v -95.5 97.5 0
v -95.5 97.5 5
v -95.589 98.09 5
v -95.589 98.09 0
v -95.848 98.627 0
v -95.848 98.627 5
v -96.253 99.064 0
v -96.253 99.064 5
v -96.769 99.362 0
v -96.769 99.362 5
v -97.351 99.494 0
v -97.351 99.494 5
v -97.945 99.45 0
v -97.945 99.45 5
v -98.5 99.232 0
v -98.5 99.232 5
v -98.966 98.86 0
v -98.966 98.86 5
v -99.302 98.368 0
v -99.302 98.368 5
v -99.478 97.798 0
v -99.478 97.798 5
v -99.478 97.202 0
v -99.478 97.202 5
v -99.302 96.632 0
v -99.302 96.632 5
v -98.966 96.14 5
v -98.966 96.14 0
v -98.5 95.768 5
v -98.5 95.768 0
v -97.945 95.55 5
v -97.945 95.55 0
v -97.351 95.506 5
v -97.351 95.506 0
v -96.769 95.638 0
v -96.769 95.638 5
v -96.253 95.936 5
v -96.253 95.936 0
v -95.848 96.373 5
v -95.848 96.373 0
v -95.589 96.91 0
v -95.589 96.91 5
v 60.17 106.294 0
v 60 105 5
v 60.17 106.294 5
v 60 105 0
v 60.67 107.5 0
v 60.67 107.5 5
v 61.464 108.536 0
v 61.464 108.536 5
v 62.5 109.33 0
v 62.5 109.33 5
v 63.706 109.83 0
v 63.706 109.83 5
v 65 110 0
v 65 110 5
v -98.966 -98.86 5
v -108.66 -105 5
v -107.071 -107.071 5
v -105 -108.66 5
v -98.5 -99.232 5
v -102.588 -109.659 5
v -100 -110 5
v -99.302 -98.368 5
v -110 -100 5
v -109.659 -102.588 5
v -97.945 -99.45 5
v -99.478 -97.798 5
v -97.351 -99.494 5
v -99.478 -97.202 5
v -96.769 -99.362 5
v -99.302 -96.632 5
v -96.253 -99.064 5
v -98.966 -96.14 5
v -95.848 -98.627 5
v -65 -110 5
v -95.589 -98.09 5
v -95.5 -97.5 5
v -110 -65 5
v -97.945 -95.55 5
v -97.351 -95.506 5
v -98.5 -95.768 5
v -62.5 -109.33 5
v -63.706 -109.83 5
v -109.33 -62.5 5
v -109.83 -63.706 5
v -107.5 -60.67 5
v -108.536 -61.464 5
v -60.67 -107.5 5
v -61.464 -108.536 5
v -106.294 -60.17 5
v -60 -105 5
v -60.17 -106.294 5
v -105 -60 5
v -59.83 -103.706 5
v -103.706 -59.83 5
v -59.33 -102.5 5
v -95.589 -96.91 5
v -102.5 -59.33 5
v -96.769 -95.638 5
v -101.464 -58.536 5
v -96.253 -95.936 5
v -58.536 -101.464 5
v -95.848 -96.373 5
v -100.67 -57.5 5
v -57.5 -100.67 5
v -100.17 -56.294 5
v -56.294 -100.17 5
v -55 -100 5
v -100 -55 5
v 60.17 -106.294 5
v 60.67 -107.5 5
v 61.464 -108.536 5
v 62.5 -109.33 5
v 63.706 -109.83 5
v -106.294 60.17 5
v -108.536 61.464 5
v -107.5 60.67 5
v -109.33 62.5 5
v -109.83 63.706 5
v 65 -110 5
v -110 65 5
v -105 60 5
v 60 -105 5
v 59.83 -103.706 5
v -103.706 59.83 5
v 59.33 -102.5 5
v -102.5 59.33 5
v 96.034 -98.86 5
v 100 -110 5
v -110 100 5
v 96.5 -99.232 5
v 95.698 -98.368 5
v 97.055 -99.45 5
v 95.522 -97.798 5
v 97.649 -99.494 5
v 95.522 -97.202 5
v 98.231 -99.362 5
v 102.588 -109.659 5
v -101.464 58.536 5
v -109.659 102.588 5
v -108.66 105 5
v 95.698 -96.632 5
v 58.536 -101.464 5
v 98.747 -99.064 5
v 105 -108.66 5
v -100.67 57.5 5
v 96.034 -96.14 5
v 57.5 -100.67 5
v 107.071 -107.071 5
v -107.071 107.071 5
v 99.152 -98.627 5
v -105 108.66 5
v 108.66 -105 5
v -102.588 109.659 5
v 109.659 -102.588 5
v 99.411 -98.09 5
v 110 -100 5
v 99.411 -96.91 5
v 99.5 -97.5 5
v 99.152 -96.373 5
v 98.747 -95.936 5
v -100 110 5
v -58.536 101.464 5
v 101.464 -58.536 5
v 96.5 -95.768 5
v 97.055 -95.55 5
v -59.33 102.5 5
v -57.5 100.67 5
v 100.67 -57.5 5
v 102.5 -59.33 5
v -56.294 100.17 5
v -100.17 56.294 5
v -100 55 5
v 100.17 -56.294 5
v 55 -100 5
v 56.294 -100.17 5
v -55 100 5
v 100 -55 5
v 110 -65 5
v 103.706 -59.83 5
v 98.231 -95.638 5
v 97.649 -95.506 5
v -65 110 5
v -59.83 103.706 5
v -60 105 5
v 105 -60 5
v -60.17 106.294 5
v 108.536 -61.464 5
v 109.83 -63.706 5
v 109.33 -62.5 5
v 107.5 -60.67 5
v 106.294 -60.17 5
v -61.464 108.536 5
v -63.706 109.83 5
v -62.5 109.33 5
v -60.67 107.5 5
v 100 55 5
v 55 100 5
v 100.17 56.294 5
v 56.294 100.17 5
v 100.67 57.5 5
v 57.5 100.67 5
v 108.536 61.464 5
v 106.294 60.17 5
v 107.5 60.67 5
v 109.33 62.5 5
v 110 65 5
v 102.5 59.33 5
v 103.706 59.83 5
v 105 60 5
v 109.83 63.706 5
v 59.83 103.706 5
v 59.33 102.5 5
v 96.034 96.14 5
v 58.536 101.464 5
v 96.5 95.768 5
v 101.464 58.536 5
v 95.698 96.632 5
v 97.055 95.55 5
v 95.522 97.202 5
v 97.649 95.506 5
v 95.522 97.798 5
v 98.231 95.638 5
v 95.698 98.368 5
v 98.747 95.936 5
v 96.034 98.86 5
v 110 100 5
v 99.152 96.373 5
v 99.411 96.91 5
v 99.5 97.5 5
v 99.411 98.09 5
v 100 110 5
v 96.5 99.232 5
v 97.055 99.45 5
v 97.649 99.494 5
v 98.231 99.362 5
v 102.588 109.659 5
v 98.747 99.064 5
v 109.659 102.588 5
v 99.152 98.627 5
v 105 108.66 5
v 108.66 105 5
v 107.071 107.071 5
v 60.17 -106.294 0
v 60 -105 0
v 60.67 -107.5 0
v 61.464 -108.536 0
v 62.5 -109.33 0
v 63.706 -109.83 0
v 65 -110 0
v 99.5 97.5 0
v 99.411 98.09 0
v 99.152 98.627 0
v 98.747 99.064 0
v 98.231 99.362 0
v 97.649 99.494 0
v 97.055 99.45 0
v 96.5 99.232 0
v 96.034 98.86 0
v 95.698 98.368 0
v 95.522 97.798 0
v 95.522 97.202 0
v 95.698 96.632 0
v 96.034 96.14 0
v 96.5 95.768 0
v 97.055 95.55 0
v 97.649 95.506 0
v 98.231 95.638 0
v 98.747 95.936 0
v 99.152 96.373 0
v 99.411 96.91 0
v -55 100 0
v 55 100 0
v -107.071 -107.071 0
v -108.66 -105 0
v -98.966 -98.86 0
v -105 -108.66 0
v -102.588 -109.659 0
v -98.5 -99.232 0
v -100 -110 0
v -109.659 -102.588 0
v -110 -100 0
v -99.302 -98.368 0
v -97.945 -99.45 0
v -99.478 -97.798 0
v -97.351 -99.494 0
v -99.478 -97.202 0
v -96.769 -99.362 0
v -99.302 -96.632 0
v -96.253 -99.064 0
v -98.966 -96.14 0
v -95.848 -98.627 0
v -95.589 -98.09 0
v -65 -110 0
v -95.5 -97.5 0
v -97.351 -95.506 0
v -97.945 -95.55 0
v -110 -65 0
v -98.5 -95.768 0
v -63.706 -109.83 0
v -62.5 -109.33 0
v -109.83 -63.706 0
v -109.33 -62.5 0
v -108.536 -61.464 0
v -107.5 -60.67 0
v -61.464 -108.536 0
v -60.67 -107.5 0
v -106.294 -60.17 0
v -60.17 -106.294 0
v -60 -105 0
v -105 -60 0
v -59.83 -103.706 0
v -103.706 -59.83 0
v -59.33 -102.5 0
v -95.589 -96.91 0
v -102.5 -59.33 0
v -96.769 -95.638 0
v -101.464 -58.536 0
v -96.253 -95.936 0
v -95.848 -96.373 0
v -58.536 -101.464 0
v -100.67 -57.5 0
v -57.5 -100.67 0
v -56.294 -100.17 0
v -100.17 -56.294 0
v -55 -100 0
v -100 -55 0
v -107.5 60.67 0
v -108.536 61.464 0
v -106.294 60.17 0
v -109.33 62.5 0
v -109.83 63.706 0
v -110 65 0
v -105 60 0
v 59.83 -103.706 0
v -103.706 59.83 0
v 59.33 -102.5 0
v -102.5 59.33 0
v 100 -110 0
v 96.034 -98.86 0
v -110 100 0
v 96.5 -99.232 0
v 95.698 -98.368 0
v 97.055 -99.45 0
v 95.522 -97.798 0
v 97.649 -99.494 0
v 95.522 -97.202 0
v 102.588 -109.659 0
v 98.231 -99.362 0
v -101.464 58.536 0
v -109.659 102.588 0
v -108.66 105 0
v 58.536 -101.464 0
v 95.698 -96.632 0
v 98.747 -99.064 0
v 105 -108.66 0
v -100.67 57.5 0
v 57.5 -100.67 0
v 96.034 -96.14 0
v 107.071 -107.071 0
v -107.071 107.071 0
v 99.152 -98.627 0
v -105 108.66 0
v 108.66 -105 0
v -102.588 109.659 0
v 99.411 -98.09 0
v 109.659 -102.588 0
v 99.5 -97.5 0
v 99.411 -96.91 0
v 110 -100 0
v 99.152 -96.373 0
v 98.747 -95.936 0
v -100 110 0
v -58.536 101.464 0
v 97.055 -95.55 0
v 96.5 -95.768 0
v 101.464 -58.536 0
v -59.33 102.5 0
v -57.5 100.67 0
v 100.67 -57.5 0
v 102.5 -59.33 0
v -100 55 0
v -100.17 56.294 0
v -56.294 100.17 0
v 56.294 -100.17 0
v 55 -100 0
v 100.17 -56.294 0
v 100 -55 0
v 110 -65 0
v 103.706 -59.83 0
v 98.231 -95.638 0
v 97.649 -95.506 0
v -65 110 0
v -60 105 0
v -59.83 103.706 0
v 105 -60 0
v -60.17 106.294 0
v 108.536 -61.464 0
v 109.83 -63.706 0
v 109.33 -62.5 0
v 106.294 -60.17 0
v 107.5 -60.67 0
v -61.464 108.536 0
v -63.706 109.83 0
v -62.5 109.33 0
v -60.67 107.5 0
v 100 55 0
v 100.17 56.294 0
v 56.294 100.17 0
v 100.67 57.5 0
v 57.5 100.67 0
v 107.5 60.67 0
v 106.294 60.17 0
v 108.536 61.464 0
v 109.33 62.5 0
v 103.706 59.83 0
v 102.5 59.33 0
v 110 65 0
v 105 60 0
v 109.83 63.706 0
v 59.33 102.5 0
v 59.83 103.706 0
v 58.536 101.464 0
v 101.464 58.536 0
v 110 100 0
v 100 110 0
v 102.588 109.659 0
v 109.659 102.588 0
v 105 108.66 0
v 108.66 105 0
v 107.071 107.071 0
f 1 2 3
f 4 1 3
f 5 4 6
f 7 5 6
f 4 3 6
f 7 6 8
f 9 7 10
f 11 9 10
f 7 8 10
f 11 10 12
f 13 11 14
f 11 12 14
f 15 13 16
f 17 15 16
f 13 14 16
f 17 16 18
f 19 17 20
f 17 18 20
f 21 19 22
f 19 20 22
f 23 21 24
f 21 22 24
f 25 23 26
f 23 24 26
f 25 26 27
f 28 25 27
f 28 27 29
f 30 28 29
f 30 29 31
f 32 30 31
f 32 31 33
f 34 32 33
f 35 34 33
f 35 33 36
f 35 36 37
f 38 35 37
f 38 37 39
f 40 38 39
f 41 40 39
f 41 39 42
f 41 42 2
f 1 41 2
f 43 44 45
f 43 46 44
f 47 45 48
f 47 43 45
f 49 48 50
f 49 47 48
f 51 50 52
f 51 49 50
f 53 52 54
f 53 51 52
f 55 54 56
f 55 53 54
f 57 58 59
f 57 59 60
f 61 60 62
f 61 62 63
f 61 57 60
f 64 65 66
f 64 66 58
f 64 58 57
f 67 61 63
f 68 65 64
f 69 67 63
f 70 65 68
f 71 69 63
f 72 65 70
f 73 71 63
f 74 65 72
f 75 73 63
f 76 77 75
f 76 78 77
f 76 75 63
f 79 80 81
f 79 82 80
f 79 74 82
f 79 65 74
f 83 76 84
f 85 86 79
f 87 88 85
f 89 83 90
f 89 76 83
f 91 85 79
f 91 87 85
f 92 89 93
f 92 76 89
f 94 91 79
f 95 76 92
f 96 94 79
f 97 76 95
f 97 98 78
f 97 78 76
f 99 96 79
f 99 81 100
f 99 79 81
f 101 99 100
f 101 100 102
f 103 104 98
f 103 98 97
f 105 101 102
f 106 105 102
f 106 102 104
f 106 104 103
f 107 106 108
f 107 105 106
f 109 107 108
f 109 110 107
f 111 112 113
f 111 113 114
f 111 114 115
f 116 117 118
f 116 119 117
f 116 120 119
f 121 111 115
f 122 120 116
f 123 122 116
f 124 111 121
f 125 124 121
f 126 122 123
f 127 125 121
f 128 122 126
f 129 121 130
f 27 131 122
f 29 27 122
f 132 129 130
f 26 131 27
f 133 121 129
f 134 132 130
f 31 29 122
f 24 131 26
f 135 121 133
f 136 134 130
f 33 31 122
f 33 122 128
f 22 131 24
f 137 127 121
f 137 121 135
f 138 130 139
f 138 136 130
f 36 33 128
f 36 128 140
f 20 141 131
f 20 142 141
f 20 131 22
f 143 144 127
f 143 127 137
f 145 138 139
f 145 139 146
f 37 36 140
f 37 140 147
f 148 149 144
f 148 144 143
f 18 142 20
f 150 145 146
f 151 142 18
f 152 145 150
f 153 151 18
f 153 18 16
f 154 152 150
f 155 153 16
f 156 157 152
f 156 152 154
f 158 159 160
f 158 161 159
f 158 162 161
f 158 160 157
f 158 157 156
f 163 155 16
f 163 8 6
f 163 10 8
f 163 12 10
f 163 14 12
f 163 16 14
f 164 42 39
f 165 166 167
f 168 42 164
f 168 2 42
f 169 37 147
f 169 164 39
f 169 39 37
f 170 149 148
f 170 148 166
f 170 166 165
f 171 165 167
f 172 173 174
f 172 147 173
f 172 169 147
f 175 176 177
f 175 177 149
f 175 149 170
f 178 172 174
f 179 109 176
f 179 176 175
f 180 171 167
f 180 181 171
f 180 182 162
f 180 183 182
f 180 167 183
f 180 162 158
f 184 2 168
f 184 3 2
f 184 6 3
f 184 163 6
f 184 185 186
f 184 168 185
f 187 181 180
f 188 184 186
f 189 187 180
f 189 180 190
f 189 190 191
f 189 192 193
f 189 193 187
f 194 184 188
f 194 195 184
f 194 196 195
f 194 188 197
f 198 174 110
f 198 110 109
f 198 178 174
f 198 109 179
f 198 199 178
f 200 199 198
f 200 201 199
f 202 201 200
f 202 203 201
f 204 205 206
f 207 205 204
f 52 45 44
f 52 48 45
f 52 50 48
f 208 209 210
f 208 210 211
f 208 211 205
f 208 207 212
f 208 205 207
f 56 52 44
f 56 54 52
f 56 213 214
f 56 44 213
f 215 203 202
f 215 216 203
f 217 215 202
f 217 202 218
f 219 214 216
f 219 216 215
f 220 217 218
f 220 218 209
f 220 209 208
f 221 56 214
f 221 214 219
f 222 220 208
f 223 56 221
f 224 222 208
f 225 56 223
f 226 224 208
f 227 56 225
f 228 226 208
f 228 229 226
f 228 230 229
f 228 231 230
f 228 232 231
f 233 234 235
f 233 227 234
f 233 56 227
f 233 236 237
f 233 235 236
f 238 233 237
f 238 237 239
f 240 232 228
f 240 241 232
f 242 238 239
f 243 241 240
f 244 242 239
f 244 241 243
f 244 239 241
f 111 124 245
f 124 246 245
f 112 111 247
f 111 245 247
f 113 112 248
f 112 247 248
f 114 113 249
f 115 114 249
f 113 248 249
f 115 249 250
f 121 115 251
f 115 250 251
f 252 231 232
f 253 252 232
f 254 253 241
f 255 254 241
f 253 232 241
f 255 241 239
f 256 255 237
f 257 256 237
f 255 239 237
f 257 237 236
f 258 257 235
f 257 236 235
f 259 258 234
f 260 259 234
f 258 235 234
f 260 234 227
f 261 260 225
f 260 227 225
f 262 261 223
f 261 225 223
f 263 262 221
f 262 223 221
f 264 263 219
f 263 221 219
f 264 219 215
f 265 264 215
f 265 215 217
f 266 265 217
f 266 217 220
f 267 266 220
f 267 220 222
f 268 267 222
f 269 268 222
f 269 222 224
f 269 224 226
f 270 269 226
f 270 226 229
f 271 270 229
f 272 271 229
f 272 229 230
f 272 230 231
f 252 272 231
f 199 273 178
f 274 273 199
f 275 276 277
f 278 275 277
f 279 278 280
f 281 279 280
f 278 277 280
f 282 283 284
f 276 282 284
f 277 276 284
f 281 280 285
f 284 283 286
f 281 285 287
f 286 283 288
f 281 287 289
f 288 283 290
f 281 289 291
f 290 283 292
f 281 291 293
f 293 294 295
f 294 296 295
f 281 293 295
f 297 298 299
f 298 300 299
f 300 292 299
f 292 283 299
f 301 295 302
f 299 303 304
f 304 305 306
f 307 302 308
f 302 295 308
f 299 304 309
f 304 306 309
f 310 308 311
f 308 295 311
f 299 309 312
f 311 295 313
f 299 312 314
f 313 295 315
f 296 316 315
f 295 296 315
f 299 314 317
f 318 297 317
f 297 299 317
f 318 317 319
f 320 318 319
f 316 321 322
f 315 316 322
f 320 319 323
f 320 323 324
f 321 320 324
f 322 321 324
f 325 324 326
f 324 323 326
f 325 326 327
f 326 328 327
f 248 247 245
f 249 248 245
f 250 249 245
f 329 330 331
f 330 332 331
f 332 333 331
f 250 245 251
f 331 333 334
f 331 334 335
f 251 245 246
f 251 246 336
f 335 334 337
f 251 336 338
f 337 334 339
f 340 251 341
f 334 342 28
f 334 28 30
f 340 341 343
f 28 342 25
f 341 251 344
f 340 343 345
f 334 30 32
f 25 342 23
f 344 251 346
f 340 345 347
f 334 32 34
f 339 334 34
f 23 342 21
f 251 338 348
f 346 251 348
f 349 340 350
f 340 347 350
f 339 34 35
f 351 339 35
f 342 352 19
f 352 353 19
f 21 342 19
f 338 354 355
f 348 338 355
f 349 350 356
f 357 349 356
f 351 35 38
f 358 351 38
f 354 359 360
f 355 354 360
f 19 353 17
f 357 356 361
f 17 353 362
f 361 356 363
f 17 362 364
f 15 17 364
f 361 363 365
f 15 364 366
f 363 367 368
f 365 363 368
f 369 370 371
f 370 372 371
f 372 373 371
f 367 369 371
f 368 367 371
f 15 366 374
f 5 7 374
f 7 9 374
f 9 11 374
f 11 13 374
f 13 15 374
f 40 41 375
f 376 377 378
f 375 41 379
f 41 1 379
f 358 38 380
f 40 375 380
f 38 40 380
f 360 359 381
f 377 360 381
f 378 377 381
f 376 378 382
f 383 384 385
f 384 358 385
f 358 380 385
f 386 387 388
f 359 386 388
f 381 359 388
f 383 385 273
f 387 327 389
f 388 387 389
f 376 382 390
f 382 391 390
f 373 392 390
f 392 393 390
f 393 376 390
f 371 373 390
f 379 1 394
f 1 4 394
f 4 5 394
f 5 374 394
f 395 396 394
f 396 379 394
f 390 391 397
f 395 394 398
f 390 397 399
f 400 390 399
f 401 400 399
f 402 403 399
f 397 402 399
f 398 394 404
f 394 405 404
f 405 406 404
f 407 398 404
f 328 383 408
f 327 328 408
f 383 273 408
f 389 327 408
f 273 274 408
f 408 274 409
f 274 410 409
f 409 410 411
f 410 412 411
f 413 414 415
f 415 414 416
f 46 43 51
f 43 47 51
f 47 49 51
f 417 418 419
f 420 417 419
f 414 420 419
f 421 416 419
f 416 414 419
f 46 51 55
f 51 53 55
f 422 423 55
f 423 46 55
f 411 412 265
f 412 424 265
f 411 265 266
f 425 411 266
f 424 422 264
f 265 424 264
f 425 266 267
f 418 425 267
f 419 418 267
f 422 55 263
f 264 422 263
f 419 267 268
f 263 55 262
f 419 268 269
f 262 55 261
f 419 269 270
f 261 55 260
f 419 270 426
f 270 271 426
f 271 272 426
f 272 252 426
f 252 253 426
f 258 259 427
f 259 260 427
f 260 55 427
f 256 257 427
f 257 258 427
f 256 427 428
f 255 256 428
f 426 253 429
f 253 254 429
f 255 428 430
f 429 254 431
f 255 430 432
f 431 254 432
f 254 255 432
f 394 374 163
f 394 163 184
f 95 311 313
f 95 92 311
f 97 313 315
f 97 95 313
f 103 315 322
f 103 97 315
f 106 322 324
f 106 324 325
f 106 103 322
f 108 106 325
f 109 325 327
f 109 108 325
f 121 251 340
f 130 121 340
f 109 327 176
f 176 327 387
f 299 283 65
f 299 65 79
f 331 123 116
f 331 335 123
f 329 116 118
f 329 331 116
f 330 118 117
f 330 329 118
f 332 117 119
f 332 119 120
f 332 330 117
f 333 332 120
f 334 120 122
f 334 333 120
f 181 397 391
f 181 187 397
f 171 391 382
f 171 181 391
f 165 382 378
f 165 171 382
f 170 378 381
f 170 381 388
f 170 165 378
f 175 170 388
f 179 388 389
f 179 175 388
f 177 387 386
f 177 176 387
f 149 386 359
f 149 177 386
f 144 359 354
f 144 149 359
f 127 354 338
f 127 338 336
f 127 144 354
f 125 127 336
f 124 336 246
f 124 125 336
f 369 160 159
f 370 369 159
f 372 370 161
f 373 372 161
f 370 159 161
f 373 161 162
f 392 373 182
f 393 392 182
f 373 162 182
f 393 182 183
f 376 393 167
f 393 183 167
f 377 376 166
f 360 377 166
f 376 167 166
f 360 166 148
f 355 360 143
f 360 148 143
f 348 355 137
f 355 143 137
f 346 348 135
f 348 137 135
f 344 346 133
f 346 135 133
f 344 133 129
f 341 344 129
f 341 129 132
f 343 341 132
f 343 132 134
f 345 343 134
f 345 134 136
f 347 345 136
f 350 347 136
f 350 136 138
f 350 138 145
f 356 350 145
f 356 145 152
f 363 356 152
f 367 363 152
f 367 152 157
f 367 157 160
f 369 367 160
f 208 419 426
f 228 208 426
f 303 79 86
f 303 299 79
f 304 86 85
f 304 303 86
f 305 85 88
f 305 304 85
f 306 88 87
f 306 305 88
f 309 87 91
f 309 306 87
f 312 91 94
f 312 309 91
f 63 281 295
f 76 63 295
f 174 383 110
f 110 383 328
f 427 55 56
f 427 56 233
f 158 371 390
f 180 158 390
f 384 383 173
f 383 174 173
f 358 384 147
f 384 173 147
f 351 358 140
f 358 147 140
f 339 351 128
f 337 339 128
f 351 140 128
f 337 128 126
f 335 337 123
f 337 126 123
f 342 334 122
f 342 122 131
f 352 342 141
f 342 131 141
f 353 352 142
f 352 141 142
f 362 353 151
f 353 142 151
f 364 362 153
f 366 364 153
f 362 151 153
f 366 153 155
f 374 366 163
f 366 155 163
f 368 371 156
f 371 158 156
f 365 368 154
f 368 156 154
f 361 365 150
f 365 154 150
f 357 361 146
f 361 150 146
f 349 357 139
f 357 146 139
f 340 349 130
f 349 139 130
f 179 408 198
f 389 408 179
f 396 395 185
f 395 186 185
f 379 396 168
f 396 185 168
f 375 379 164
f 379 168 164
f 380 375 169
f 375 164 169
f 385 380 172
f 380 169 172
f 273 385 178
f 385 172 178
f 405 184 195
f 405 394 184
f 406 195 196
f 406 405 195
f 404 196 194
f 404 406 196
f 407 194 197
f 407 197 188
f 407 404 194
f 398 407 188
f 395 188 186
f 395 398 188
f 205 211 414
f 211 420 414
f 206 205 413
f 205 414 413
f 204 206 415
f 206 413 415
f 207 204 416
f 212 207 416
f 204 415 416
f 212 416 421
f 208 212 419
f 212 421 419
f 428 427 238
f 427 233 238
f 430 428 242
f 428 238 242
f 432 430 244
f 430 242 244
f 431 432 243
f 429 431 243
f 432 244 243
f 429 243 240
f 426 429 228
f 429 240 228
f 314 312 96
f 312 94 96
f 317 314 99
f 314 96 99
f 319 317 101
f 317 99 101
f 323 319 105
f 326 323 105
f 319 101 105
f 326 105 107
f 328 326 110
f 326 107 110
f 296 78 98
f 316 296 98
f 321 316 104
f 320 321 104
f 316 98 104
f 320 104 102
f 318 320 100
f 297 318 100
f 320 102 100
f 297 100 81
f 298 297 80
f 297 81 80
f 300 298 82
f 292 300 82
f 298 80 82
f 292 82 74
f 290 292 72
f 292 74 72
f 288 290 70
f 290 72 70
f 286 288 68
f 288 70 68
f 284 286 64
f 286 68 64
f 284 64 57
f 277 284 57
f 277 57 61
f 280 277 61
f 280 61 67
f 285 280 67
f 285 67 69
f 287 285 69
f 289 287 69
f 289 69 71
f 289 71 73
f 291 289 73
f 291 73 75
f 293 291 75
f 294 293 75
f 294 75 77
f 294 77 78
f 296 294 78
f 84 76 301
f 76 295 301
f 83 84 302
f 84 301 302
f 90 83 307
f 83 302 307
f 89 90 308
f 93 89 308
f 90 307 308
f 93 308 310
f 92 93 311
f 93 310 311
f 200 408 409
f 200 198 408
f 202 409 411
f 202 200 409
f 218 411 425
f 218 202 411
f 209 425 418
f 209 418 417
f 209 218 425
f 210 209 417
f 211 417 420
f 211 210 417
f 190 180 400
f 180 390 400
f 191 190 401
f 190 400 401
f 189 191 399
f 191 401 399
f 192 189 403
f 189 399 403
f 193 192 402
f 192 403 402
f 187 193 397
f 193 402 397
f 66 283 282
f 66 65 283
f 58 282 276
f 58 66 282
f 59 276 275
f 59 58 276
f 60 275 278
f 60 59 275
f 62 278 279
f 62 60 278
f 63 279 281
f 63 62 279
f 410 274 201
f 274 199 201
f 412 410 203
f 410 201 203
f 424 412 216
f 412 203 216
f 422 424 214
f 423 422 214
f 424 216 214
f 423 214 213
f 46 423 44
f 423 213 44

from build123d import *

# Parameters (mm, degrees)
F0_W     = 220
F0_H     = 220
F1_DEPTH = 5
F2_R     = 2
F3_DEPTH = 5.001
F4_W     = 20
F4_H     = 120
F4_W_2   = 120
F4_H_2   = 20
F5_DEPTH = 5.001
F6_R     = 10
F7_R     = 4.99999


# Not quite as in the source:
# - a fillet or chamfer is up to 0.001 mm smaller than in the source, because OpenCascade refuses the exact size


with BuildPart() as f1:
    # F0 (on Top) → F1 (new body)
    with BuildSketch(Plane.XY):
        Rectangle(F0_W, F0_H)
    extrude(amount=F1_DEPTH)

    # F2 (on face) → F3 (cut, through all)
    with BuildSketch(Plane.XY.offset(5)):
        with Locations((-97.5, 97.5)):
            Circle(F2_R)
        with Locations((-97.5, -97.5)):
            Circle(F2_R)
        with Locations((97.5, -97.5)):
            Circle(F2_R)
        with Locations((97.5, 97.5)):
            Circle(F2_R)
    extrude(amount=-F3_DEPTH, mode=Mode.SUBTRACT)

    # F4 (on face) → F5 (cut, through all)
    with BuildSketch(Plane(origin=(0, 0, 0), x_dir=(1, 0, 0), z_dir=(0, 0, -1))):
        with Locations((110, 0)):
            Rectangle(F4_W, F4_H)
        with Locations((0, 110)):
            Rectangle(F4_W_2, F4_H_2)
        with Locations((-110, 0)):
            Rectangle(F4_W, F4_H)
        with Locations((0, -110)):
            Rectangle(F4_W_2, F4_H_2)
    extrude(amount=-F5_DEPTH, mode=Mode.SUBTRACT)

    # F6
    f6_edges = [f1.edges().sort_by_distance(p)[0] for p in [
        (110, -110, 2.5),
        (-110, -110, 2.5),
        (110, 110, 2.5),
        (-110, 110, 2.5),
    ]]
    fillet(f6_edges, radius=F6_R)

    # F7 (radius 5 in the source; OpenCascade refuses exactly that, so slightly less here)
    f7_edges = [f1.edges().sort_by_distance(p)[0] for p in [
        (110, 60, 2.5),
        (100, 60, 2.5),
        (100, -60, 2.5),
        (110, -60, 2.5),
        (60, -100, 2.5),
        (60, -110, 2.5),
        (-60, -100, 2.5),
        (-60, -110, 2.5),
        (-100, -60, 2.5),
        (-110, -60, 2.5),
        (-100, 60, 2.5),
        (-110, 60, 2.5),
        (-60, 100, 2.5),
        (-60, 110, 2.5),
        (60, 100, 2.5),
        (60, 110, 2.5),
    ]]
    fillet(f7_edges, radius=F7_R)


solid = f1.part
